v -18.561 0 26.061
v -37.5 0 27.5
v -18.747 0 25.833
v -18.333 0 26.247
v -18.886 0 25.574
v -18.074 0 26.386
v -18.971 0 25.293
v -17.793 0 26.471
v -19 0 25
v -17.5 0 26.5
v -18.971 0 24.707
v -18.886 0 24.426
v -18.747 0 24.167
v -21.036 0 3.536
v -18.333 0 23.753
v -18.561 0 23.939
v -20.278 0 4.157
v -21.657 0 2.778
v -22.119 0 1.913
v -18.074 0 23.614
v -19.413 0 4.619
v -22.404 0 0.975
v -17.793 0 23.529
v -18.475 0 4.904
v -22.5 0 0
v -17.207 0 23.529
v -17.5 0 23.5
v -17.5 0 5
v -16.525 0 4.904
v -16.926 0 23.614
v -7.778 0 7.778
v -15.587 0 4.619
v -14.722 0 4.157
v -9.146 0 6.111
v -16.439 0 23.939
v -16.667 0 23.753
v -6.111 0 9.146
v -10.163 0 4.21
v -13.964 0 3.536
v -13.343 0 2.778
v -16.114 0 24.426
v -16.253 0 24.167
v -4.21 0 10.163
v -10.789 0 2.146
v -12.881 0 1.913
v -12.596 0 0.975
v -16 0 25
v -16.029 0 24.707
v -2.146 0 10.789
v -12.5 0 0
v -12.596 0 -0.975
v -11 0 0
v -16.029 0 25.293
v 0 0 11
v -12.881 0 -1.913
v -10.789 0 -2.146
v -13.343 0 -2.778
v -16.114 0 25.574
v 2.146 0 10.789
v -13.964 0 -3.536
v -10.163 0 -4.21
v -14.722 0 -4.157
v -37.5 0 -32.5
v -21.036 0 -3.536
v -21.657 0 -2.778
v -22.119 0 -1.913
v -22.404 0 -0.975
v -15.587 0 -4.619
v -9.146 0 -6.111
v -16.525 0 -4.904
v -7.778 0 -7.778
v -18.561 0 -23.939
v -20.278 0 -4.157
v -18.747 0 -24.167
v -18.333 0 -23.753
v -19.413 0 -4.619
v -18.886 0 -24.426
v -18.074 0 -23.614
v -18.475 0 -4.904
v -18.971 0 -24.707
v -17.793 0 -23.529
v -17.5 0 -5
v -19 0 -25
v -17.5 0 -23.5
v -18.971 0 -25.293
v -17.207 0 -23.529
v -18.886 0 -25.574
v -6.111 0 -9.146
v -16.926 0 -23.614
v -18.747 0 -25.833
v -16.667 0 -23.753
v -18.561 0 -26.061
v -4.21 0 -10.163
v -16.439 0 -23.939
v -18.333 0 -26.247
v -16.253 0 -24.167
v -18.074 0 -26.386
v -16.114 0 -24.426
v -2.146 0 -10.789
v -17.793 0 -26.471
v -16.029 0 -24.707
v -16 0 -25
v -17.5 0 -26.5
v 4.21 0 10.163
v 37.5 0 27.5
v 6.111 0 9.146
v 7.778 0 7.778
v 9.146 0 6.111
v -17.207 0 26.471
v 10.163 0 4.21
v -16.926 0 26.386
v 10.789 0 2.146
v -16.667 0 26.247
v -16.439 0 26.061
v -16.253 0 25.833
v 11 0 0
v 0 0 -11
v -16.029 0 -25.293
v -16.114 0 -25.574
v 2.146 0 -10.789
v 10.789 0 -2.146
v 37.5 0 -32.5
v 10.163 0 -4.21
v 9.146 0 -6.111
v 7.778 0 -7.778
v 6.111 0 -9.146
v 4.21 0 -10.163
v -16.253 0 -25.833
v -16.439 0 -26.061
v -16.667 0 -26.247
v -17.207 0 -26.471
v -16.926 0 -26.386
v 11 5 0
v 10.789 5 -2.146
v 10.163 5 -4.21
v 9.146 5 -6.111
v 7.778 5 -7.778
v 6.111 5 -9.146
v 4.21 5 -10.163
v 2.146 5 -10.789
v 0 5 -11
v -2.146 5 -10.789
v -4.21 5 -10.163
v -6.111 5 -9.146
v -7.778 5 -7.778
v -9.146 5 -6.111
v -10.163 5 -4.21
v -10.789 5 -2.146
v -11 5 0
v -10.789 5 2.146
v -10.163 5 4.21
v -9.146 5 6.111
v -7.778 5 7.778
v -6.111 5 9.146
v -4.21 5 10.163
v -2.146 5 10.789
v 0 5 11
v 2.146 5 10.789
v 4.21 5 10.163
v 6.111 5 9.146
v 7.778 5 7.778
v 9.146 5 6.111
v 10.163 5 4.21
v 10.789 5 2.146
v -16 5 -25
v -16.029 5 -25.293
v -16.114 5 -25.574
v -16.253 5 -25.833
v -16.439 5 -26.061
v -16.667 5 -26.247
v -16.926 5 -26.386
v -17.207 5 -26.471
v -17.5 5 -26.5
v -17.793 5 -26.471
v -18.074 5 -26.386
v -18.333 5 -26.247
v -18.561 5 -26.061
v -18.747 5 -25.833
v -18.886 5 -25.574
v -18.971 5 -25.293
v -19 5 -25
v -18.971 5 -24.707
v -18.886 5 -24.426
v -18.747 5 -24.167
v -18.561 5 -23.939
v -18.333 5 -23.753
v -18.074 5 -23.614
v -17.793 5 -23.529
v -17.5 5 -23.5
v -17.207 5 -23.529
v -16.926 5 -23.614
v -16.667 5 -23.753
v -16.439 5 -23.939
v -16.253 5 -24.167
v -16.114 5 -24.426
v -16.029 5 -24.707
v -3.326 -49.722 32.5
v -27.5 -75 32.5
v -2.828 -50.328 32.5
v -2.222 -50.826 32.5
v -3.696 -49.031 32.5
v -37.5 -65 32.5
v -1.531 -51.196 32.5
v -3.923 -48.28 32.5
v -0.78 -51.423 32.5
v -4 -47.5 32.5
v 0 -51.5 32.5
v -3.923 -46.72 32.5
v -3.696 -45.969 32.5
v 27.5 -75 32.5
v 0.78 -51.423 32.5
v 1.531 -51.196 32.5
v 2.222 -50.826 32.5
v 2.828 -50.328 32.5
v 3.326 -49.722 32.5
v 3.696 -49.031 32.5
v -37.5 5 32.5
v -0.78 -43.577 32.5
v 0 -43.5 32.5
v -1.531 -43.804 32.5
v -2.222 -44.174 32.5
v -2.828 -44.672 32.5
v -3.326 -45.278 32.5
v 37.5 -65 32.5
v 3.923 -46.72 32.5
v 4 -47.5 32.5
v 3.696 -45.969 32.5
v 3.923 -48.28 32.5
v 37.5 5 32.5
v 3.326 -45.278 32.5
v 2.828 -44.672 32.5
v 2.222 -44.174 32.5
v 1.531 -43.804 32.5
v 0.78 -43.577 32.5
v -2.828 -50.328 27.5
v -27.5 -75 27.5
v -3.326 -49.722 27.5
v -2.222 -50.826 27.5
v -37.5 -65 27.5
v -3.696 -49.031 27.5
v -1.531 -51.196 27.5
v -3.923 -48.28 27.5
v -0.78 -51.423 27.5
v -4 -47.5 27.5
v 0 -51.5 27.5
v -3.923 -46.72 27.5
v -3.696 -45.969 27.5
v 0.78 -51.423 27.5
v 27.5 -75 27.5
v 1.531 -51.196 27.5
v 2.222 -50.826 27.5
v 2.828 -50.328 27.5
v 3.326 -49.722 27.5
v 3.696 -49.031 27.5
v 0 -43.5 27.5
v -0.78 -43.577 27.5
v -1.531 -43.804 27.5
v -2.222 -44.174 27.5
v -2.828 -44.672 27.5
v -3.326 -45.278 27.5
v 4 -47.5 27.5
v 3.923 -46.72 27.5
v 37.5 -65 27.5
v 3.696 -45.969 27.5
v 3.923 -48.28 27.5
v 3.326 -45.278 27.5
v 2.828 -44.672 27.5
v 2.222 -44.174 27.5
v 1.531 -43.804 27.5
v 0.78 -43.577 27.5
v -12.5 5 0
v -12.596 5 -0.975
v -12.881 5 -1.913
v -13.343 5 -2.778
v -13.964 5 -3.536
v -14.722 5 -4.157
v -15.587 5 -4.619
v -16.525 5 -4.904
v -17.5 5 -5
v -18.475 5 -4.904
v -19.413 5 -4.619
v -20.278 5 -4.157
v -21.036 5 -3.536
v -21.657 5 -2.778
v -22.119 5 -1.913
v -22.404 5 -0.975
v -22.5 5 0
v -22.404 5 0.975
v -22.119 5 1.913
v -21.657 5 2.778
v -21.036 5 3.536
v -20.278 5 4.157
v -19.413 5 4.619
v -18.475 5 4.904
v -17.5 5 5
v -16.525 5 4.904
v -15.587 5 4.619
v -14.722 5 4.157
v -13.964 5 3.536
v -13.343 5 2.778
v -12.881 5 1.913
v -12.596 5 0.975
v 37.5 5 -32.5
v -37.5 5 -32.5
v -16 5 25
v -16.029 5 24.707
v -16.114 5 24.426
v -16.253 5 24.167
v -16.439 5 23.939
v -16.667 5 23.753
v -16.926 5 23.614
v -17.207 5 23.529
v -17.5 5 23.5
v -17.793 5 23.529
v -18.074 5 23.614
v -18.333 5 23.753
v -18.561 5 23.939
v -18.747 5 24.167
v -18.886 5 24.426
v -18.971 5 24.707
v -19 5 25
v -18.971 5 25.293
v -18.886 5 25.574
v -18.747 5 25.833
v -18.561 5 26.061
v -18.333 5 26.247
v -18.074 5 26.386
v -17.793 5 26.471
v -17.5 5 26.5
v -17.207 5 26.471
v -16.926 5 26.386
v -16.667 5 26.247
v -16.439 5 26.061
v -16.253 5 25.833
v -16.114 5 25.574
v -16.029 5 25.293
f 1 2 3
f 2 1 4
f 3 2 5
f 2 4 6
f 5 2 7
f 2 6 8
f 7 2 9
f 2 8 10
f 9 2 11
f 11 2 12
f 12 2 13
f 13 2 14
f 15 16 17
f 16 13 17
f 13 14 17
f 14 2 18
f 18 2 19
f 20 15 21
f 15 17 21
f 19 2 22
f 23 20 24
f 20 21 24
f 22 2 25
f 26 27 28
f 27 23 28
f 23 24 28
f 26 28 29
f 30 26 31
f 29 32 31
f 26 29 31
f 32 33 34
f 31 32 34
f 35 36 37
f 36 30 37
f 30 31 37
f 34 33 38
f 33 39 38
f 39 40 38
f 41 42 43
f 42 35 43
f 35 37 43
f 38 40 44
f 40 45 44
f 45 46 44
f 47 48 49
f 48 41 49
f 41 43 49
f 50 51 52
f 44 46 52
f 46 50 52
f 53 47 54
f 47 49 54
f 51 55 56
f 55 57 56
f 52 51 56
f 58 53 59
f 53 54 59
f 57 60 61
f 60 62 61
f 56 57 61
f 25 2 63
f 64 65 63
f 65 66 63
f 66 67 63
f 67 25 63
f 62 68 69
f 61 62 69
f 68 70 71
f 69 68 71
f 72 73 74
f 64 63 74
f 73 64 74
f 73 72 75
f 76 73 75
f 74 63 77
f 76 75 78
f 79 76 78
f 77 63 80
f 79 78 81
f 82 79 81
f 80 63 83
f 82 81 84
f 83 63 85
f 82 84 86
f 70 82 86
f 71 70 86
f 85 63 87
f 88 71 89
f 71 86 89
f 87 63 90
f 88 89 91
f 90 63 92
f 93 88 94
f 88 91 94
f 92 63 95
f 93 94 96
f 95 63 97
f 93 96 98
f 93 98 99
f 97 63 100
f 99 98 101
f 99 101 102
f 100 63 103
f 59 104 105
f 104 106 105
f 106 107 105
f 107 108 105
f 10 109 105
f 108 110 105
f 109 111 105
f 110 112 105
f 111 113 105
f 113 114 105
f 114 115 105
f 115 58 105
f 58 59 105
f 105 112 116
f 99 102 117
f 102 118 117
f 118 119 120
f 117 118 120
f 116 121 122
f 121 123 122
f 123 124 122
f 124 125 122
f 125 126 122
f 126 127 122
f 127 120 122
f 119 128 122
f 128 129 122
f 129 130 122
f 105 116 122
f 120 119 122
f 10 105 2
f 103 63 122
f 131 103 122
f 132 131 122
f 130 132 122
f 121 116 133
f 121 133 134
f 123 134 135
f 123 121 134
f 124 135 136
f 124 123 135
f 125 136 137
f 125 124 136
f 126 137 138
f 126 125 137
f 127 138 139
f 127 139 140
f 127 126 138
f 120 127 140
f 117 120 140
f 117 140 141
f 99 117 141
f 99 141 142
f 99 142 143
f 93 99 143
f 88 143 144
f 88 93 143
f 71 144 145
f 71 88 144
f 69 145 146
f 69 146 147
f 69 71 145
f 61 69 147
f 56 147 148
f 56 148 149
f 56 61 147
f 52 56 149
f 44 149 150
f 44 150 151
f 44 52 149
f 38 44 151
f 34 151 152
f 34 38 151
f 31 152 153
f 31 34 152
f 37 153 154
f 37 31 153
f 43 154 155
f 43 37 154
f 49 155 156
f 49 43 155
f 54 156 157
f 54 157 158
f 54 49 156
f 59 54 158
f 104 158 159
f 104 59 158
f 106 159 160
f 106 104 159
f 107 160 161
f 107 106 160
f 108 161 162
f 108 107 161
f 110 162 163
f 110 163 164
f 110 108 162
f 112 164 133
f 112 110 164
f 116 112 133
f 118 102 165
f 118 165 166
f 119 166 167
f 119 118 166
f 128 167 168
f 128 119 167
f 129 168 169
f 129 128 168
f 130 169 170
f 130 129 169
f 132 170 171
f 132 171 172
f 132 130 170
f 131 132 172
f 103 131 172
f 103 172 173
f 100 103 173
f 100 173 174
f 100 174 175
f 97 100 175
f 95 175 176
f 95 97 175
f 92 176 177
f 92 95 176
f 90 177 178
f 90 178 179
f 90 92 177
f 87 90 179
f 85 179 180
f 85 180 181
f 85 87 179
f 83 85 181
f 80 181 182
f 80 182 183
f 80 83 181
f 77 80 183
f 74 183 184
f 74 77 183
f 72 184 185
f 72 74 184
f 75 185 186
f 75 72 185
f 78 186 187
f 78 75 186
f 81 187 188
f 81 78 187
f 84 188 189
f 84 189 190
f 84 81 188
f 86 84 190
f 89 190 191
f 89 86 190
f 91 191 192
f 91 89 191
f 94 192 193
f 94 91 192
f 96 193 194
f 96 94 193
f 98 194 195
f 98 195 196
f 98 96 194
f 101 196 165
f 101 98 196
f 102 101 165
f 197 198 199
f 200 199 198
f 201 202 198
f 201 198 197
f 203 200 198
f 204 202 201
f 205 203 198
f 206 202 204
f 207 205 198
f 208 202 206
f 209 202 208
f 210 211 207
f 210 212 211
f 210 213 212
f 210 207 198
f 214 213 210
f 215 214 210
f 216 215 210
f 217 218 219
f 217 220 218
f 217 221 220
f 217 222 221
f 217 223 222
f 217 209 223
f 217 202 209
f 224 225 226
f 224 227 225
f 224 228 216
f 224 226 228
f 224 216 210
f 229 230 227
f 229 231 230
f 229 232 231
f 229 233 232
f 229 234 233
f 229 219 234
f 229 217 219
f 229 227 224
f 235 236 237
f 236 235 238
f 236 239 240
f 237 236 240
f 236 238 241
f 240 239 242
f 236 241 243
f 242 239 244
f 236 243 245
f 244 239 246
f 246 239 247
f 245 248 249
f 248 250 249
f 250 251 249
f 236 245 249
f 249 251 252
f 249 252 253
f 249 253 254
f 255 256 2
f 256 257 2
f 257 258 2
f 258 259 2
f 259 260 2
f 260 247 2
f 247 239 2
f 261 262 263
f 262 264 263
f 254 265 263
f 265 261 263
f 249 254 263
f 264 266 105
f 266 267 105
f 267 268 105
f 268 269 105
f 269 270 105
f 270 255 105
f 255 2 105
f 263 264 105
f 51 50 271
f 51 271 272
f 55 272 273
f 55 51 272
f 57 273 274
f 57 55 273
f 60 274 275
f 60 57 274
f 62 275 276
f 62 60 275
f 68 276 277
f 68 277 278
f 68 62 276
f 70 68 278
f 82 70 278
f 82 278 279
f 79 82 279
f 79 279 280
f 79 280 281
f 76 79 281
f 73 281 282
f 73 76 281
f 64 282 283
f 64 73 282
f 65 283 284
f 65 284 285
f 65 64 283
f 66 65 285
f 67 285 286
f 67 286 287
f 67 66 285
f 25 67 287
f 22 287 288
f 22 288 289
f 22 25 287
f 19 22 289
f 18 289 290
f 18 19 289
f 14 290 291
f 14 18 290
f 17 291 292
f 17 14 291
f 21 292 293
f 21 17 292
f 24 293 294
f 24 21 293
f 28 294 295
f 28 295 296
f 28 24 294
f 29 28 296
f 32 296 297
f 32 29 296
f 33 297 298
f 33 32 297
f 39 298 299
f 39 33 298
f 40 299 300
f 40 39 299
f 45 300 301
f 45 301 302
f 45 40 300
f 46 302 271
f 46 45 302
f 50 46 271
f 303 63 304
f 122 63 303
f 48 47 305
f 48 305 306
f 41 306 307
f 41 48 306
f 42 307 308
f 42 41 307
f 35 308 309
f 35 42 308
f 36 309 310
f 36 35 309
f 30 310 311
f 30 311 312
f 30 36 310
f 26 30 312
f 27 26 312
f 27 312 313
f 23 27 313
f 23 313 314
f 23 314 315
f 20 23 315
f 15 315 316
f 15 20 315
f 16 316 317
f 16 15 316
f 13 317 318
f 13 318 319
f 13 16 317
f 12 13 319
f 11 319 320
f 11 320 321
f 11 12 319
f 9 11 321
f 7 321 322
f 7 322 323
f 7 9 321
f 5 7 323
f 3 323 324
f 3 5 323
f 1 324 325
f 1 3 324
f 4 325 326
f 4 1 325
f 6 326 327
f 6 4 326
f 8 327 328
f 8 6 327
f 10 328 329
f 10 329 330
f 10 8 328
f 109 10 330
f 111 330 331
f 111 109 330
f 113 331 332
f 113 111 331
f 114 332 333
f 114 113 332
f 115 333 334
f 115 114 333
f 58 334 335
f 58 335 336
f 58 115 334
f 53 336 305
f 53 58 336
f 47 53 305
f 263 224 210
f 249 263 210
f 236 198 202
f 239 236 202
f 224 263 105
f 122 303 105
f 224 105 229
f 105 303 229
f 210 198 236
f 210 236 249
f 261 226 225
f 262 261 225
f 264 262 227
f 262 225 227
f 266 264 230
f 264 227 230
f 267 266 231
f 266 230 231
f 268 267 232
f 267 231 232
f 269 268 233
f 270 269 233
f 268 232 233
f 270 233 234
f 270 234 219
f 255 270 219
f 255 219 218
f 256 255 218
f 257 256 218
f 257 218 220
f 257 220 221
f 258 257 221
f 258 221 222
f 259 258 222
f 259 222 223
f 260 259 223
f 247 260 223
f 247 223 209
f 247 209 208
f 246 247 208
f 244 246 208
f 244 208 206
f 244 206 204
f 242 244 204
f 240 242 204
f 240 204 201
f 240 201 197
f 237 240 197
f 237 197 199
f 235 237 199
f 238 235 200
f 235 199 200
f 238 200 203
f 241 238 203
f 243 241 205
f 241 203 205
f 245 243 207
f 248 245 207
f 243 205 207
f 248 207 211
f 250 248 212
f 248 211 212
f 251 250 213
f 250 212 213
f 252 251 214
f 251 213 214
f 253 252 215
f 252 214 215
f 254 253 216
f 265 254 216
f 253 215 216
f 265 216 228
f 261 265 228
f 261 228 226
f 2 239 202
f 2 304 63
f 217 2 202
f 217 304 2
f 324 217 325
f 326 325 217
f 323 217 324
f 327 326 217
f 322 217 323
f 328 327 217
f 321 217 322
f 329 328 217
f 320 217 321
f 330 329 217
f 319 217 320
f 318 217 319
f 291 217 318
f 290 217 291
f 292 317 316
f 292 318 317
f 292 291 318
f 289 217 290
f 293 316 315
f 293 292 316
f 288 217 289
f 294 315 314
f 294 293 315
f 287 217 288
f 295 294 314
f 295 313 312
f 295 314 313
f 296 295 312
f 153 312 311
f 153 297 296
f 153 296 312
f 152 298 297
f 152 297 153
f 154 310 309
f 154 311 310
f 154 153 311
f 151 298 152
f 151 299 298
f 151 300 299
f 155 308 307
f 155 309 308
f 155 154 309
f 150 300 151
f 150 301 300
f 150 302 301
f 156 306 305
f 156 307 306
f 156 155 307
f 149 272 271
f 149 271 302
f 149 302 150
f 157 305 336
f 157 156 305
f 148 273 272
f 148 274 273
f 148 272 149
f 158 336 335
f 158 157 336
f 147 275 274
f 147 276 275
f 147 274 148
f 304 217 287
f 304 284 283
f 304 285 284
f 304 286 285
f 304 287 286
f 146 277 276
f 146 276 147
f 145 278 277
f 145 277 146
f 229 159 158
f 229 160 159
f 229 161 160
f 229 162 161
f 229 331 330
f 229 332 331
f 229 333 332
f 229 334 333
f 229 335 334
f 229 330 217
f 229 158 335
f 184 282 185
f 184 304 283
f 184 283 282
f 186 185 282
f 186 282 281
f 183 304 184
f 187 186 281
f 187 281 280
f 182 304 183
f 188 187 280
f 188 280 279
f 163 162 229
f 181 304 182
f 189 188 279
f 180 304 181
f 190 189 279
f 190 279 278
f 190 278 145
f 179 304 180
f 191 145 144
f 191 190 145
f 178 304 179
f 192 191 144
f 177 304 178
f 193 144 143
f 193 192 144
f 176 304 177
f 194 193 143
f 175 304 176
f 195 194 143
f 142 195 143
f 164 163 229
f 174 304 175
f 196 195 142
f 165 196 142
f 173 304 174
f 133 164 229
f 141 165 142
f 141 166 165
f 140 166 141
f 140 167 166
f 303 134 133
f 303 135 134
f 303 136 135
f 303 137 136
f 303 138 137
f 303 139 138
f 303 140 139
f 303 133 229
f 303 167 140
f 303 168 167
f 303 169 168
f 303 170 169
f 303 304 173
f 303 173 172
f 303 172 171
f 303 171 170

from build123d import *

# Parameters (mm, degrees)
SKETCH1_W           = 75
SKETCH1_H           = 65
SKETCH1_R           = 5
SKETCH1_R_2         = 11
SKETCH1_R_3         = 1.5
BOSS_EXTRUDE1_DEPTH = 5
SKETCH2_W           = 75
SKETCH2_H           = 5
BOSS_EXTRUDE2_DEPTH = 75
CUT_EXTRUDE1_REACH  = 67
CUT_EXTRUDE2_REACH  = 7
CUT_EXTRUDE3_REACH  = 67
SKETCH5_R           = 4
CUT_EXTRUDE4_REACH  = 67
SKETCH6_R           = 2.5
CUT_EXTRUDE5_REACH  = 7


with BuildPart() as part:
    # Sketch1 → Boss-Extrude1 (new body)
    with BuildSketch(Plane(origin=(0, 0, 0), x_dir=(1, 0, 0), z_dir=(0, 1, 0))):
        Rectangle(SKETCH1_W, SKETCH1_H)
        with Locations((-17.5, 0)):
            Circle(SKETCH1_R, mode=Mode.SUBTRACT)
        Circle(SKETCH1_R_2, mode=Mode.SUBTRACT)
        with Locations((-17.5, -25)):
            Circle(SKETCH1_R_3, mode=Mode.SUBTRACT)
        with Locations((-17.5, 25)):
            Circle(SKETCH1_R_3, mode=Mode.SUBTRACT)
    extrude(amount=BOSS_EXTRUDE1_DEPTH)

    # Sketch2 → Boss-Extrude2 (add)
    with BuildSketch(Plane.XZ):
        with Locations((0, 30)):
            Rectangle(SKETCH2_W, SKETCH2_H)
        with Locations((0, -30)):
            Rectangle(SKETCH2_W, SKETCH2_H)
    extrude(amount=BOSS_EXTRUDE2_DEPTH)

    # Sketch3 → Cut-Extrude1 (cut, up to next)
    with BuildSketch(Plane.XY.offset(32.5), mode=Mode.PRIVATE) as cut_extrude1_sk1:
        Polygon((-37.5, -75), (-27.5, -75), (-37.5, -65), align=None)
    cut_extrude1_tool1 = extrude(cut_extrude1_sk1.sketch, amount=-CUT_EXTRUDE1_REACH, mode=Mode.PRIVATE) & part.part
    add(cut_extrude1_tool1.solids().sort_by_distance((-34.166667, -71.666667, 32.5))[0], mode=Mode.SUBTRACT)
    # Sketch3 → Cut-Extrude1 (cut, up to next)
    with BuildSketch(Plane.XY.offset(32.5), mode=Mode.PRIVATE) as cut_extrude1_sk2:
        Polygon((37.5, -75), (37.5, -65), (27.5, -75), align=None)
    cut_extrude1_tool2 = extrude(cut_extrude1_sk2.sketch, amount=-CUT_EXTRUDE1_REACH, mode=Mode.PRIVATE) & part.part
    add(cut_extrude1_tool2.solids().sort_by_distance((34.166667, -71.666667, 32.5))[0], mode=Mode.SUBTRACT)

    # Sketch4 → Cut-Extrude2 (cut, up to next)
    with BuildSketch(Plane.XY.offset(-27.5), mode=Mode.PRIVATE) as cut_extrude2_sk1:
        Polygon((-37.5, -65), (-37.5, -75), (-27.5, -75), align=None)
    cut_extrude2_tool1 = extrude(cut_extrude2_sk1.sketch, amount=-CUT_EXTRUDE2_REACH, mode=Mode.PRIVATE) & part.part
    add(cut_extrude2_tool1.solids().sort_by_distance((-34.166667, -71.666667, -27.5))[0], mode=Mode.SUBTRACT)
    # Sketch4 → Cut-Extrude2 (cut, up to next)
    with BuildSketch(Plane.XY.offset(-27.5), mode=Mode.PRIVATE) as cut_extrude2_sk2:
        Polygon((37.5, -65), (27.5, -75), (37.5, -75), align=None)
    cut_extrude2_tool2 = extrude(cut_extrude2_sk2.sketch, amount=-CUT_EXTRUDE2_REACH, mode=Mode.PRIVATE) & part.part
    add(cut_extrude2_tool2.solids().sort_by_distance((34.166667, -71.666667, -27.5))[0], mode=Mode.SUBTRACT)

    # Sketch5 → Cut-Extrude3 (cut, up to next)
    with BuildSketch(Plane.XY.offset(32.5), mode=Mode.PRIVATE) as cut_extrude3_sk1:
        with Locations((0, -47.5)):
            Circle(SKETCH5_R)
    cut_extrude3_tool1 = extrude(cut_extrude3_sk1.sketch, amount=-CUT_EXTRUDE3_REACH, mode=Mode.PRIVATE) & part.part
    add(cut_extrude3_tool1.solids().sort_by_distance((0, -47.5, 32.5))[0], mode=Mode.SUBTRACT)

    # Sketch6 → Cut-Extrude4 (cut, up to next)
    with BuildSketch(Plane(origin=(0, 0, -32.5), x_dir=(-1, 0, 0), z_dir=(0, 0, -1)), mode=Mode.PRIVATE) as cut_extrude4_sk1:
        with Locations((0, -47.5)):
            Circle(SKETCH6_R)
    cut_extrude4_tool1 = extrude(cut_extrude4_sk1.sketch, amount=-CUT_EXTRUDE4_REACH, mode=Mode.PRIVATE) & part.part
    add(cut_extrude4_tool1.solids().sort_by_distance((0, -47.5, -32.5))[0], mode=Mode.SUBTRACT)

    # Sketch7 → Cut-Extrude5 (cut, up to next)
    with BuildSketch(Plane.XY.offset(-27.5), mode=Mode.PRIVATE) as cut_extrude5_sk1:
        Polygon((-37.5, 0), (37.5, 0), (37.5, -65), (27.5, -75), (-27.5, -75), (-37.5, -65), align=None)
    cut_extrude5_tool1 = extrude(cut_extrude5_sk1.sketch, amount=-CUT_EXTRUDE5_REACH, mode=Mode.PRIVATE) & part.part
    add(cut_extrude5_tool1.solids().sort_by_distance((0, -36.881599, -27.5))[0], mode=Mode.SUBTRACT)


solid = part.part
